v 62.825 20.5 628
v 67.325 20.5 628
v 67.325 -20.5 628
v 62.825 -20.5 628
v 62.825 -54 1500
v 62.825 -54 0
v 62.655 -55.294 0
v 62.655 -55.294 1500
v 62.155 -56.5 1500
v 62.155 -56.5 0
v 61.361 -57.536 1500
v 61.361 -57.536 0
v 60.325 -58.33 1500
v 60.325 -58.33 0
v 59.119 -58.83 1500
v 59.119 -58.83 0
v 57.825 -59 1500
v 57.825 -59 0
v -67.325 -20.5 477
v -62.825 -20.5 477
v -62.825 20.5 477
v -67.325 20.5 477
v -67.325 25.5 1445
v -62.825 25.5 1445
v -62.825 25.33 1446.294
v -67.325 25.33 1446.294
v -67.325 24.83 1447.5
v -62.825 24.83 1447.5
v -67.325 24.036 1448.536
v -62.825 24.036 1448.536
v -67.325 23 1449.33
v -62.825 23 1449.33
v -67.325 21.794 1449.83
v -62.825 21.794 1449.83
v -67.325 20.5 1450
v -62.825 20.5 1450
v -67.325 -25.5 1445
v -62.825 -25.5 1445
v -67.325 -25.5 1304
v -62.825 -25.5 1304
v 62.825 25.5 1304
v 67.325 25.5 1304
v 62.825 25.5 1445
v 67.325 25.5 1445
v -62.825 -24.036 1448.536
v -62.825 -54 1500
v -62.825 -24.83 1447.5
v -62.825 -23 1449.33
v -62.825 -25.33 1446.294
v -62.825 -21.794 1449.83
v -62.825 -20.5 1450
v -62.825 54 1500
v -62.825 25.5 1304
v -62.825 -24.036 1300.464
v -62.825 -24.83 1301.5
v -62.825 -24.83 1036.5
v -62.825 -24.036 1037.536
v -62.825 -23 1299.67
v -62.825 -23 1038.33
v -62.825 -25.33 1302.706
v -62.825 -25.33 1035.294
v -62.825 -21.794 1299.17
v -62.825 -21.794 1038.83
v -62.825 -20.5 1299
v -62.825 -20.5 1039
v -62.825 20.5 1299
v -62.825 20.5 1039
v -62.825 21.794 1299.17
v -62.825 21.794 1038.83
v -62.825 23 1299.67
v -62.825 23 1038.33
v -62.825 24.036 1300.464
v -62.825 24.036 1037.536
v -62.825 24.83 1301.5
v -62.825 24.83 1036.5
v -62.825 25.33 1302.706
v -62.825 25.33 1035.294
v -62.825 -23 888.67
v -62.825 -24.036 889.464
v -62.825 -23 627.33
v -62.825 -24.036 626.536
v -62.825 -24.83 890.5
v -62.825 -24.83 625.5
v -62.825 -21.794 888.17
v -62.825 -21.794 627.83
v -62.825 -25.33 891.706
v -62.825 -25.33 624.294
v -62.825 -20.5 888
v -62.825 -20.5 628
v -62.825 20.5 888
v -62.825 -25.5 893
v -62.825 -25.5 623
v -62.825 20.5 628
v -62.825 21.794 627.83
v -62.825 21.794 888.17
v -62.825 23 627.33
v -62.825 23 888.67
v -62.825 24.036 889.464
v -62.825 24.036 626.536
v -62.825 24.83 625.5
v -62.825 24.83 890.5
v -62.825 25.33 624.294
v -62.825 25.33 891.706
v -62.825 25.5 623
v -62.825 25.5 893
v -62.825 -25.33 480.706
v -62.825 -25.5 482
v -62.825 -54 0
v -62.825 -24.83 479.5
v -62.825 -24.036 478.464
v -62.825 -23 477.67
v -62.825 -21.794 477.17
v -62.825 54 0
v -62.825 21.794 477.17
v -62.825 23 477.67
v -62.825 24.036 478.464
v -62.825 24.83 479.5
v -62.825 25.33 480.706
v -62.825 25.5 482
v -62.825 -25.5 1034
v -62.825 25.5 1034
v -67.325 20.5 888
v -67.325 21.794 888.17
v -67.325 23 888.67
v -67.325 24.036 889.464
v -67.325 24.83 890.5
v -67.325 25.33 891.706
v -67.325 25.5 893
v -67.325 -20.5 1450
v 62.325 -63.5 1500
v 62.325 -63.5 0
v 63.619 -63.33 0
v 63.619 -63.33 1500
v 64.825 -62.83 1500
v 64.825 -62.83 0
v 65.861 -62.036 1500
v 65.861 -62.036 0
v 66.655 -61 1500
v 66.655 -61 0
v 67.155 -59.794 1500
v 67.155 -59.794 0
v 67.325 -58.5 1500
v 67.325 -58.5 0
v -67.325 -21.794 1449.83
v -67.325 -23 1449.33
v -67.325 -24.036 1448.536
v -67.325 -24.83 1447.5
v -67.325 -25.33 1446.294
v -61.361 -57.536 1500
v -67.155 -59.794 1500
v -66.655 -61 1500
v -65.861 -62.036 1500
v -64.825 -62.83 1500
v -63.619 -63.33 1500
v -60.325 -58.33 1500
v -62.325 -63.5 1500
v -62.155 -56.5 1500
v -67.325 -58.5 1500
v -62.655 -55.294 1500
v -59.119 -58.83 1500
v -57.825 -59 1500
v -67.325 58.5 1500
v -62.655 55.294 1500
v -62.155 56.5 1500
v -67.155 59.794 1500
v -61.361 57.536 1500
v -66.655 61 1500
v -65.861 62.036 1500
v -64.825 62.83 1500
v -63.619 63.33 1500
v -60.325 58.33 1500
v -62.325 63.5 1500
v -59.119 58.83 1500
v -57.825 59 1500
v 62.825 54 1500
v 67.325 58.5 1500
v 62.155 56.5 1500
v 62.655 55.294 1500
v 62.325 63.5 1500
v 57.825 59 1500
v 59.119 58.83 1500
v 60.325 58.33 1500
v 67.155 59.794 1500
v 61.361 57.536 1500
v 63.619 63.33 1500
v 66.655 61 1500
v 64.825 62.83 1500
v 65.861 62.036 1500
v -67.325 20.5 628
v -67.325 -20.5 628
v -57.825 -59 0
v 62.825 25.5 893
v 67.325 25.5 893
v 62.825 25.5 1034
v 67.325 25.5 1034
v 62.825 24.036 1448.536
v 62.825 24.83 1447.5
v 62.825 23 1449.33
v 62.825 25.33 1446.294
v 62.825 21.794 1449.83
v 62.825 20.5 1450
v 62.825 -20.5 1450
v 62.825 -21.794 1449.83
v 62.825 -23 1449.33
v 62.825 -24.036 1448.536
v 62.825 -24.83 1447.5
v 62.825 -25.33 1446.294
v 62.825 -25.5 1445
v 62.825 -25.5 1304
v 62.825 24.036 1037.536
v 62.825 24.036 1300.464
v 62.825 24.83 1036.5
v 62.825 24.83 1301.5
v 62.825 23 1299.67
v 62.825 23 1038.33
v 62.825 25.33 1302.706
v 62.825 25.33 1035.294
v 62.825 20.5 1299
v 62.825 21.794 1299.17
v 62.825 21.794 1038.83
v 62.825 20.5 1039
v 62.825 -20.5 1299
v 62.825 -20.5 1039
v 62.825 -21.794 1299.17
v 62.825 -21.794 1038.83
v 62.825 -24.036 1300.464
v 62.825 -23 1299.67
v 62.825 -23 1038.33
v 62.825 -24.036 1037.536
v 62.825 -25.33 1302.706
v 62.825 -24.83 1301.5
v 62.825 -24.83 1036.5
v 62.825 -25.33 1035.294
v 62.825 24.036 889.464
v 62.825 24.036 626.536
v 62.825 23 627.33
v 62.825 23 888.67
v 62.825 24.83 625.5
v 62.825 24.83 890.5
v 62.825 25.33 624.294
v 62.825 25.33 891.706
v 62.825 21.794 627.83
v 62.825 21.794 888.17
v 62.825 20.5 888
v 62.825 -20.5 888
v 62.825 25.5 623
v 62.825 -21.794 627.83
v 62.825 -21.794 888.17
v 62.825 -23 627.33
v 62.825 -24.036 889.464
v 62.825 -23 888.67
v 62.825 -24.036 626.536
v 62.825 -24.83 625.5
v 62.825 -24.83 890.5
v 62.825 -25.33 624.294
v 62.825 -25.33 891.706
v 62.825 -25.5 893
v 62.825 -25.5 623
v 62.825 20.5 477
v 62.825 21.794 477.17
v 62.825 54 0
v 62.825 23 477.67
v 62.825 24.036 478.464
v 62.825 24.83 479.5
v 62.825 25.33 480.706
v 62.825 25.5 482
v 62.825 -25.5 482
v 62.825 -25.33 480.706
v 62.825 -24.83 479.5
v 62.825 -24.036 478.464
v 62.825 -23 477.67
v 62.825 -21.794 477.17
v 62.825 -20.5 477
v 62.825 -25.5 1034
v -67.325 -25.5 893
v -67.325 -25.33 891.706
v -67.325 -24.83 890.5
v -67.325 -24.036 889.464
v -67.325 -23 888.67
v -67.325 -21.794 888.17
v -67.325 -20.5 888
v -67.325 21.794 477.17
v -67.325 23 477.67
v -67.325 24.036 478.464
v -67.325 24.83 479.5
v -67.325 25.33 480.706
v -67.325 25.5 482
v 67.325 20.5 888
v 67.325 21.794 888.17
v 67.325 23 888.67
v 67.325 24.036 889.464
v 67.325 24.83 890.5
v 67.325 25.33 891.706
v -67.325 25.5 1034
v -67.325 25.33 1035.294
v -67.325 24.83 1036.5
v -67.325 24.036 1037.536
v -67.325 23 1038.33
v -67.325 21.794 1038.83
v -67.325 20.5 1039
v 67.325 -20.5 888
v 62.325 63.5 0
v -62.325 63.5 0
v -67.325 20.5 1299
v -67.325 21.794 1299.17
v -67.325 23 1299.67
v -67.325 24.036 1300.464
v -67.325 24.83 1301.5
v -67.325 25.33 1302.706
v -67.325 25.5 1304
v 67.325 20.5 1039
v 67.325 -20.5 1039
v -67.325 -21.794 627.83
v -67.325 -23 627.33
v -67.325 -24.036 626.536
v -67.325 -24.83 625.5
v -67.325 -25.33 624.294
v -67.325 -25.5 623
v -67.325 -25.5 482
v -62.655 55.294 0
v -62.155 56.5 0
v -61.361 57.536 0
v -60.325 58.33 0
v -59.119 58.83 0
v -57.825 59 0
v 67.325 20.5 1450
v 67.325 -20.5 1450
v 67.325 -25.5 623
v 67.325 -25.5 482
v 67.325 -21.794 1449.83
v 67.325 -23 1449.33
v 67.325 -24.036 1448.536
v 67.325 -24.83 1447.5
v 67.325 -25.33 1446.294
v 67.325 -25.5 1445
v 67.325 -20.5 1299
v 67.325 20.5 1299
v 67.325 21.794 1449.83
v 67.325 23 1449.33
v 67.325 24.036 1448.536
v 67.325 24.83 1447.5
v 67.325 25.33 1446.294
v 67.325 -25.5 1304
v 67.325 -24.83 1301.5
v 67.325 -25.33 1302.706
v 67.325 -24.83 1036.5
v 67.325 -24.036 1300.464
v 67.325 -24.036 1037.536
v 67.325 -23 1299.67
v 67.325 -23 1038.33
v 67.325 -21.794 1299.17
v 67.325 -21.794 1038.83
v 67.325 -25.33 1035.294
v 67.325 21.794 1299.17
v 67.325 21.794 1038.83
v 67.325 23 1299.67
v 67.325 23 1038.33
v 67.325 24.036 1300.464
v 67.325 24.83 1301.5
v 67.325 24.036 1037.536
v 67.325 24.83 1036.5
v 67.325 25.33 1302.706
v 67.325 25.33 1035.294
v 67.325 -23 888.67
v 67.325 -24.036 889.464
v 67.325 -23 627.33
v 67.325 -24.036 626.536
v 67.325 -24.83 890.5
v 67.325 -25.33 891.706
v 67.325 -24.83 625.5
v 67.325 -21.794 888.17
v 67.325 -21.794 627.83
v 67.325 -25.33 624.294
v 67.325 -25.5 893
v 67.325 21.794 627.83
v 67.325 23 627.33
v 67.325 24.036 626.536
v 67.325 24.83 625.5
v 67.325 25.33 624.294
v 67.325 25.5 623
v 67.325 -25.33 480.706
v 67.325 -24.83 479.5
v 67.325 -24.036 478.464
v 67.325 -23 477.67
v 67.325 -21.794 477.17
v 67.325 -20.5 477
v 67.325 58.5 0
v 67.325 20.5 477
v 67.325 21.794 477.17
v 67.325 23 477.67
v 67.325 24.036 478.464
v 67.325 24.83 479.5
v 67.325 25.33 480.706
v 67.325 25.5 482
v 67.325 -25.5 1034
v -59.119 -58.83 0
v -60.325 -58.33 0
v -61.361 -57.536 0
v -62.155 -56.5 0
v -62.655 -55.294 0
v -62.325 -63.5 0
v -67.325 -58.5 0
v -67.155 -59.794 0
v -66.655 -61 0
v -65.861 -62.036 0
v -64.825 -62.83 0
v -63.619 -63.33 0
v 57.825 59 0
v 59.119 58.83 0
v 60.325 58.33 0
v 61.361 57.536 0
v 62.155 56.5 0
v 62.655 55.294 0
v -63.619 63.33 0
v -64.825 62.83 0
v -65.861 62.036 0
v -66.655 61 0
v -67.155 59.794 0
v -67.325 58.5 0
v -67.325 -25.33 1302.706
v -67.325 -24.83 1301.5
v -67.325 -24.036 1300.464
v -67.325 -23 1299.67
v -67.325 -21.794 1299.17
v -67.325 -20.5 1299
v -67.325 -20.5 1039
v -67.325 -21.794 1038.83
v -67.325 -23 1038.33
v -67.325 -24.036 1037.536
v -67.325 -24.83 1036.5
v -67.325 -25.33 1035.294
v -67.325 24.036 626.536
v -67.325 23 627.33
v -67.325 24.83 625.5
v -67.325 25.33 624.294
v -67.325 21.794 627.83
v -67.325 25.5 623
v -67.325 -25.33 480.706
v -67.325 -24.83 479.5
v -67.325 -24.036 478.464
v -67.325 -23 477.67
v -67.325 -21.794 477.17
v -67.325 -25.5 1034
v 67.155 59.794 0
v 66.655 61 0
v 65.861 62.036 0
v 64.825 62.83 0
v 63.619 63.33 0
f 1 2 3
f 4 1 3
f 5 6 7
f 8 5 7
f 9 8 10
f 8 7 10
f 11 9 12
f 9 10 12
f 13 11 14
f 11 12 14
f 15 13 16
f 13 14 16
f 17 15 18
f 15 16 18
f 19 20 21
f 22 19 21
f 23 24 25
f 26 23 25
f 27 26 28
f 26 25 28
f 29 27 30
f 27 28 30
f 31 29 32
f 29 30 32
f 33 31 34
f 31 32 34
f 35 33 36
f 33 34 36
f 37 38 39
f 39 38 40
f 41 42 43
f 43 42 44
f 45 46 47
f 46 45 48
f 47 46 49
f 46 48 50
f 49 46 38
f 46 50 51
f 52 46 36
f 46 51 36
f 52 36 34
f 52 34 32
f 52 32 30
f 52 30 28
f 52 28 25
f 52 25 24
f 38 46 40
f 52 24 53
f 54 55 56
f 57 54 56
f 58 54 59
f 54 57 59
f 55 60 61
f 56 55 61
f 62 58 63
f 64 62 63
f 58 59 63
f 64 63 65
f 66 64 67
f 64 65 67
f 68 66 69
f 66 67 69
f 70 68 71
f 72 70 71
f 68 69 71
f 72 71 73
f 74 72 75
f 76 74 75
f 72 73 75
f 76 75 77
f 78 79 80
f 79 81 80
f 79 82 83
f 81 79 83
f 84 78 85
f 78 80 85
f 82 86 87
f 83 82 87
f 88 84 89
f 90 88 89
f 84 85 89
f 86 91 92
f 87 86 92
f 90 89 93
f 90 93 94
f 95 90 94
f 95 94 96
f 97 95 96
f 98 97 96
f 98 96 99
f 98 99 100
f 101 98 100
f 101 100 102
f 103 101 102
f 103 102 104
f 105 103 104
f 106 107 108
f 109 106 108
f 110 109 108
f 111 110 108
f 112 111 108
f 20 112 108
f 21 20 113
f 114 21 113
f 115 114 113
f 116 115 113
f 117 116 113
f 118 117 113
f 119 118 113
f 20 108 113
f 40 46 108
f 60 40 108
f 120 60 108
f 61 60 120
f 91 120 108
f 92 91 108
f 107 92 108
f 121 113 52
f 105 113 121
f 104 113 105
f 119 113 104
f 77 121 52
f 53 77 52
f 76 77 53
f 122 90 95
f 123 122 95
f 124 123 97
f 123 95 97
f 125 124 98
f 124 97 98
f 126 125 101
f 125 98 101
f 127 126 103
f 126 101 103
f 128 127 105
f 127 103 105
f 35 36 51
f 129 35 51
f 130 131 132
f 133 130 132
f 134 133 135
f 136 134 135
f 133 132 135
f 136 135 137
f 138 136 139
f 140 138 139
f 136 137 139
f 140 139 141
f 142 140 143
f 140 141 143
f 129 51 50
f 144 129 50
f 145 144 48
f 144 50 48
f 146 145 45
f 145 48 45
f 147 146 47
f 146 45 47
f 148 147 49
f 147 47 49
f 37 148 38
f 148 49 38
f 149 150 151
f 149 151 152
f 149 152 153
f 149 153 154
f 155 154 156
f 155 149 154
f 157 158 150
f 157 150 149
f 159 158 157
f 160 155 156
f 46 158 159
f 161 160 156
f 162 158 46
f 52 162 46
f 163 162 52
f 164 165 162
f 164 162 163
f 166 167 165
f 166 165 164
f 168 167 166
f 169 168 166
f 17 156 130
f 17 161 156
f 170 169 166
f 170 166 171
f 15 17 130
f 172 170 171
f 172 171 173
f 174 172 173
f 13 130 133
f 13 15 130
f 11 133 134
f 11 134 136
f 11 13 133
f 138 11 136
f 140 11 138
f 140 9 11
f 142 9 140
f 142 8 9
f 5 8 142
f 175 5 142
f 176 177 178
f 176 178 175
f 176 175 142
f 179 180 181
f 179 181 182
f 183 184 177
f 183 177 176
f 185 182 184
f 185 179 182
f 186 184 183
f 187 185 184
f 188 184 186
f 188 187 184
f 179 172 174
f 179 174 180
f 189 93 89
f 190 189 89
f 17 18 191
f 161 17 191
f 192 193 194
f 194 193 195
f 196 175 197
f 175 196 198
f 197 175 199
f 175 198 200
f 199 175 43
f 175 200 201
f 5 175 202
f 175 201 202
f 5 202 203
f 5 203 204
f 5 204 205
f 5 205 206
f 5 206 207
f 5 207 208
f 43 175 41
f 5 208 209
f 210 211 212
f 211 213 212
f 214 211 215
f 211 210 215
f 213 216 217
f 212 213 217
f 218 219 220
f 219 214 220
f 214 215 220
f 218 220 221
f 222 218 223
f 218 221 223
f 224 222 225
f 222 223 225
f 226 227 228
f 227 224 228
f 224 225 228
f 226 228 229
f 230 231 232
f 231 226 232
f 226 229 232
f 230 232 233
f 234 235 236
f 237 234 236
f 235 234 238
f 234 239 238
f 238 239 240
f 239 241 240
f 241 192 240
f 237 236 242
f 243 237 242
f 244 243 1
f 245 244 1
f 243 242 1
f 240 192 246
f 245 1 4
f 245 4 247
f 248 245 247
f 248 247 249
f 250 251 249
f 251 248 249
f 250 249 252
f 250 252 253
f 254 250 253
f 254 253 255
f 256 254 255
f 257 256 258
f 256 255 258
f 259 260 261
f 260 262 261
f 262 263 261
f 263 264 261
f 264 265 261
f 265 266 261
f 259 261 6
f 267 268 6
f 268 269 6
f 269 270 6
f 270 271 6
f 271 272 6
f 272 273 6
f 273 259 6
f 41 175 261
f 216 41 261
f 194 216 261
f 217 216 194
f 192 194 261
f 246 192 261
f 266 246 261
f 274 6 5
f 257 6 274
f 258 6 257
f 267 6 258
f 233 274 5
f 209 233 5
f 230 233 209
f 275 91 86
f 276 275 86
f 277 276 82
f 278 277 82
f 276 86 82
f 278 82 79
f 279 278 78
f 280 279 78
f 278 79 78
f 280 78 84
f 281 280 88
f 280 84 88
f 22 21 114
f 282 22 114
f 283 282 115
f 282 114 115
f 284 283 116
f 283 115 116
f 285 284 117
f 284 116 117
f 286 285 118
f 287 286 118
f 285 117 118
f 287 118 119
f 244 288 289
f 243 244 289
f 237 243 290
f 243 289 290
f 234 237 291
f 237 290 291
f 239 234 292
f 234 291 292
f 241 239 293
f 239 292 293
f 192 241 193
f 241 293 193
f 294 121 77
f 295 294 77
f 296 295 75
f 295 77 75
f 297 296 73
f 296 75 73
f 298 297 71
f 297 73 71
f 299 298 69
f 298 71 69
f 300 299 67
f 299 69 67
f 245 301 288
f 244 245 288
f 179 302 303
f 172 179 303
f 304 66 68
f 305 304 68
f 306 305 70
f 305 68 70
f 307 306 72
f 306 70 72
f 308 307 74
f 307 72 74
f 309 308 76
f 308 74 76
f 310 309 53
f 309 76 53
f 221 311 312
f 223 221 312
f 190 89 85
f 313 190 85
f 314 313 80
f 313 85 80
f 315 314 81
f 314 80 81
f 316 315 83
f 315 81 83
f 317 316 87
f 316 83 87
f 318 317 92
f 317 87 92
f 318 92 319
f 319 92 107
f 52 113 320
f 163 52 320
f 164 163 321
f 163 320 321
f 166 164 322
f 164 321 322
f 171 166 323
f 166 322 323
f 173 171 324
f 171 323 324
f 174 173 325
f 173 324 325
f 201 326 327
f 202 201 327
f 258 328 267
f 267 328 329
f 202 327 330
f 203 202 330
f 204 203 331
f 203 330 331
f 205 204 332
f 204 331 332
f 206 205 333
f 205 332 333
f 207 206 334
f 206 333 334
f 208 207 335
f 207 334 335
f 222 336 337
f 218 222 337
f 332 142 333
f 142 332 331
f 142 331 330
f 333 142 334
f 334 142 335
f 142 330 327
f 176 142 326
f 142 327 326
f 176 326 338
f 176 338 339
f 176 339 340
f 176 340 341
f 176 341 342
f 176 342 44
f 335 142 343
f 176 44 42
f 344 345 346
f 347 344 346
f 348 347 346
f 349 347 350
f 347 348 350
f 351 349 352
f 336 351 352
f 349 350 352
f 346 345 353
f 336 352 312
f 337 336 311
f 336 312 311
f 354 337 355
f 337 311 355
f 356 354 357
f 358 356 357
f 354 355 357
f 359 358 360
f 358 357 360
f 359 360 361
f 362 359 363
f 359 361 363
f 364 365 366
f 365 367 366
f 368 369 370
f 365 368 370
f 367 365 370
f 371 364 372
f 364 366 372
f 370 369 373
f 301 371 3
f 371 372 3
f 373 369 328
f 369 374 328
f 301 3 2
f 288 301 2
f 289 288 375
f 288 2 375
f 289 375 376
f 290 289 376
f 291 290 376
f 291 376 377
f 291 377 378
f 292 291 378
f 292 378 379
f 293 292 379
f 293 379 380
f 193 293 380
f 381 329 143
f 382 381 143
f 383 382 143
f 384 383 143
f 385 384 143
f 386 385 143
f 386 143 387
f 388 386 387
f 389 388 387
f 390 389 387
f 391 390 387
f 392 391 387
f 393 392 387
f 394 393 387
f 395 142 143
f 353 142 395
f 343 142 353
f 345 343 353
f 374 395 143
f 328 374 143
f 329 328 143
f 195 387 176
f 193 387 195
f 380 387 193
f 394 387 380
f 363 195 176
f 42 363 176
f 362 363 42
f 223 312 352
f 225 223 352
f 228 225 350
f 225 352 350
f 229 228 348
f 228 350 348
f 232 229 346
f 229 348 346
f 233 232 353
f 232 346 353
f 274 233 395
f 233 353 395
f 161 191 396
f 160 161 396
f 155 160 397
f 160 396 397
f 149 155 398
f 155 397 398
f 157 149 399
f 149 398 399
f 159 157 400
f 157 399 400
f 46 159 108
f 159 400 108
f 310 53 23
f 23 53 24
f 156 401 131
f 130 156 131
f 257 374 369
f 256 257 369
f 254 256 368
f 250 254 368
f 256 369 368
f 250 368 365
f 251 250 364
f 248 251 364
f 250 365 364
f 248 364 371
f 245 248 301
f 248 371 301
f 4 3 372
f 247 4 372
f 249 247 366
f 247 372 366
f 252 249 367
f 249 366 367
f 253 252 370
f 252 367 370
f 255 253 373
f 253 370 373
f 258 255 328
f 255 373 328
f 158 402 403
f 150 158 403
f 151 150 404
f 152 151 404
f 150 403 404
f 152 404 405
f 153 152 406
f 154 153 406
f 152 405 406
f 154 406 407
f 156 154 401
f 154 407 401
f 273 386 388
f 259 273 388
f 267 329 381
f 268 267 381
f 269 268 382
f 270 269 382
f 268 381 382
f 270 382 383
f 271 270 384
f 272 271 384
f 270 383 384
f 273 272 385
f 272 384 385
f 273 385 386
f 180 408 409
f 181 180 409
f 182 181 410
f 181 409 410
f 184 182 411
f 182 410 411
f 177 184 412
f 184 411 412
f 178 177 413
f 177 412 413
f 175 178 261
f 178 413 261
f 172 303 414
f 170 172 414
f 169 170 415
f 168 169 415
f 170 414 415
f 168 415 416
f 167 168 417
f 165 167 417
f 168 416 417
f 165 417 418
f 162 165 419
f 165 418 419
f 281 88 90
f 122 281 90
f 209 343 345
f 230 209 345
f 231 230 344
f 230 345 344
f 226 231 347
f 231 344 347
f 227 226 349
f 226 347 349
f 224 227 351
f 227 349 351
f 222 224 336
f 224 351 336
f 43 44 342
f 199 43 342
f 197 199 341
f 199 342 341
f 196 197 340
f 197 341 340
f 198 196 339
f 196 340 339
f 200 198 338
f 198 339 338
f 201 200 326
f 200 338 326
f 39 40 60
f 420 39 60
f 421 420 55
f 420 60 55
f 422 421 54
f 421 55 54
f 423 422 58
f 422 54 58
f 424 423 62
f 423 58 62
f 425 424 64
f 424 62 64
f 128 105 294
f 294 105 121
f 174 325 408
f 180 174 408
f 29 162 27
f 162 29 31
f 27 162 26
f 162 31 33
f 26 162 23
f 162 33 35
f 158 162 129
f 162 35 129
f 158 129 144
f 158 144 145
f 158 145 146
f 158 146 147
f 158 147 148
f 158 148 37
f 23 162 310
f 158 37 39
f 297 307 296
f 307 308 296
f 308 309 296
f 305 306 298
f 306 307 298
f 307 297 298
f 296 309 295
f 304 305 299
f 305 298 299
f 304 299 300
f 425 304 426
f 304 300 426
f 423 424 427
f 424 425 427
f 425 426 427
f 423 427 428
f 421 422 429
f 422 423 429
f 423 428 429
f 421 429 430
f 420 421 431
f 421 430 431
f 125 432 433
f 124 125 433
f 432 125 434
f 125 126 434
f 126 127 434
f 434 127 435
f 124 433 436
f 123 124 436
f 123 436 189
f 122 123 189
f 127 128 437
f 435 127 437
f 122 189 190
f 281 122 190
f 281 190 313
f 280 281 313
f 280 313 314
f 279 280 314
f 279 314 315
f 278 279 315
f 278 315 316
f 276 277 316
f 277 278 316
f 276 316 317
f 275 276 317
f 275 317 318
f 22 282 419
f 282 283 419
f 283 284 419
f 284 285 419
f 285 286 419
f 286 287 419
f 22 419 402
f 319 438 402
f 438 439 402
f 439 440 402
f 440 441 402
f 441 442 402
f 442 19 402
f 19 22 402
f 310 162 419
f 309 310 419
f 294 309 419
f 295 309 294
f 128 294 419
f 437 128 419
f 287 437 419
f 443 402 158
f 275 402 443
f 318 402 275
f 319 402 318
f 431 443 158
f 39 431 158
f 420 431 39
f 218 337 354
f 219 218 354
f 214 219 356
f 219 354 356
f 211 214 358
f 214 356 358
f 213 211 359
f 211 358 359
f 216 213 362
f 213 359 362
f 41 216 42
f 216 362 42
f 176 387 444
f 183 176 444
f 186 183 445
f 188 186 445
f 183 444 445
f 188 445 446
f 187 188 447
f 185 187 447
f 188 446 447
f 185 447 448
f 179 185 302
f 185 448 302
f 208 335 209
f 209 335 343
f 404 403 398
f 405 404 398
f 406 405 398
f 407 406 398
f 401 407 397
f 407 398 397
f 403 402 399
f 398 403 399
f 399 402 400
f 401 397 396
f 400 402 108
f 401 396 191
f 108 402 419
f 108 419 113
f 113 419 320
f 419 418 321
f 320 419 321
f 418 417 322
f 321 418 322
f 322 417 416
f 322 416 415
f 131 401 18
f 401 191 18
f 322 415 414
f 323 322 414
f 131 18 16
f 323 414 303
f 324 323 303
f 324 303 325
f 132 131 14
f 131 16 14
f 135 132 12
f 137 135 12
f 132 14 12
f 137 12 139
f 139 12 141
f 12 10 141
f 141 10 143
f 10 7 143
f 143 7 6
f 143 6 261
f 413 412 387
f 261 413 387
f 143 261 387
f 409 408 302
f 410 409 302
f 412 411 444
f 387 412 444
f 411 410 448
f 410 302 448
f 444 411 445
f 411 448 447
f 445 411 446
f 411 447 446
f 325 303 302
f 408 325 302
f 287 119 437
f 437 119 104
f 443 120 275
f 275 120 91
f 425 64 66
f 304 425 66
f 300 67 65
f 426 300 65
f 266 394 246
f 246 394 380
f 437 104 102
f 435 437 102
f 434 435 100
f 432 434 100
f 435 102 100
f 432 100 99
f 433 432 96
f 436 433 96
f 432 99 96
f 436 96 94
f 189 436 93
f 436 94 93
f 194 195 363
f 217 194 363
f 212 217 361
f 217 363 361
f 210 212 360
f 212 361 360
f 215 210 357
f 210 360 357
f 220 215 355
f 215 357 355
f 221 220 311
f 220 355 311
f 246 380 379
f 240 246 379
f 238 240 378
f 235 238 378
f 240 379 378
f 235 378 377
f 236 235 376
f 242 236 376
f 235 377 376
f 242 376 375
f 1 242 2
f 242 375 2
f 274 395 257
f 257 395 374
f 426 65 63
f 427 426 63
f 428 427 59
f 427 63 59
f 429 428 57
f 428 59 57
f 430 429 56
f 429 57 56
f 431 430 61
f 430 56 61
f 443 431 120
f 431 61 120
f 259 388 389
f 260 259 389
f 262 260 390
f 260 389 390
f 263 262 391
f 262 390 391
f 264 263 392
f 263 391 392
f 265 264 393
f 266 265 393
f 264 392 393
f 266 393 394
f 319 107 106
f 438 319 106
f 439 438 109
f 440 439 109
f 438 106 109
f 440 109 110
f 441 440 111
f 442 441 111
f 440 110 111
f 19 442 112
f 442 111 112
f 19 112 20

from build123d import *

# Parameters (mm, degrees)
F1_DEPTH = 1500
F4_DEPTH = 150


# Not quite as in the source:
# - the program builds the solid bodies; features that only make, move or delete a surface that nothing else refers to are left out


with BuildPart() as f1:
    # F0 (on Top) → F1 (new body)
    with BuildSketch(Plane.XY):
        with BuildLine():
            Line((-62.3253015232, -63.5), (62.3253015232, -63.5))
            ThreePointArc((62.3253015232, -63.5), (65.8608354292, -62.0355339059), (67.3253015232, -58.5))
            Line((67.3253015232, -58.5), (67.3253015232, 58.5))
            ThreePointArc((67.3253015232, 58.5), (65.8608354292, 62.0355339059), (62.3253015232, 63.5))
            Line((62.3253015232, 63.5), (-62.3253015232, 63.5))
            ThreePointArc((-62.3253015232, 63.5), (-65.8608354292, 62.0355339059), (-67.3253015232, 58.5))
            Line((-67.3253015232, 58.5), (-67.3253015232, -58.5))
            ThreePointArc((-67.3253015232, -58.5), (-65.8608354292, -62.0355339059), (-62.3253015232, -63.5))
        make_face()
        with BuildLine():
            Line((-57.8253015232, 59), (57.8253015232, 59))
            ThreePointArc((57.8253015232, 59), (61.3608354292, 57.5355339059), (62.8253015232, 54))
            Line((62.8253015232, 54), (62.8253015232, -54))
            ThreePointArc((62.8253015232, -54), (61.3608354292, -57.5355339059), (57.8253015232, -59))
            Line((57.8253015232, -59), (-57.8253015232, -59))
            ThreePointArc((-57.8253015232, -59), (-61.3608354292, -57.5355339059), (-62.8253015232, -54))
            Line((-62.8253015232, -54), (-62.8253015232, 54))
            ThreePointArc((-62.8253015232, 54), (-61.3608354292, 57.5355339059), (-57.8253015232, 59))
        make_face(mode=Mode.SUBTRACT)
    extrude(amount=F1_DEPTH)

    # F2 (on face) → F4 (cut)
    with BuildSketch(Plane.YZ.offset(67.3253015232)):
        with BuildLine():
            ThreePointArc((-25.5, 1304), (-24.0355339059, 1300.4644660941), (-20.5, 1299))
            Line((-20.5, 1299), (20.5, 1299))
            ThreePointArc((20.5, 1299), (24.0355339059, 1300.4644660941), (25.5, 1304))
            Line((25.5, 1304), (25.5, 1445))
            ThreePointArc((25.5, 1445), (24.0355339059, 1448.5355339059), (20.5, 1450))
            Line((20.5, 1450), (-20.5, 1450))
            ThreePointArc((-20.5, 1450), (-24.0355339059, 1448.5355339059), (-25.5, 1445))
            Line((-25.5, 1445), (-25.5, 1304))
        make_face()
        with BuildLine():
            ThreePointArc((-25.5, 893), (-24.0355339059, 889.4644660941), (-20.5, 888))
            Line((-20.5, 888), (20.5, 888))
            ThreePointArc((20.5, 888), (24.0355339059, 889.4644660941), (25.5, 893))
            Line((25.5, 893), (25.5, 1034))
            ThreePointArc((25.5, 1034), (24.0355339059, 1037.5355339059), (20.5, 1039))
            Line((20.5, 1039), (-20.5, 1039))
            ThreePointArc((-20.5, 1039), (-24.0355339059, 1037.5355339059), (-25.5, 1034))
            Line((-25.5, 1034), (-25.5, 893))
        make_face()
        with BuildLine():
            ThreePointArc((-25.5, 482), (-24.0355339059, 478.4644660941), (-20.5, 477))
            Line((-20.5, 477), (20.5, 477))
            ThreePointArc((20.5, 477), (24.0355339059, 478.4644660941), (25.5, 482))
            Line((25.5, 482), (25.5, 623))
            ThreePointArc((25.5, 623), (24.0355339059, 626.5355339059), (20.5, 628))
            Line((20.5, 628), (-20.5, 628))
            ThreePointArc((-20.5, 628), (-24.0355339059, 626.5355339059), (-25.5, 623))
            Line((-25.5, 623), (-25.5, 482))
        make_face()
    extrude(amount=-F4_DEPTH, mode=Mode.SUBTRACT)


solid = f1.part
